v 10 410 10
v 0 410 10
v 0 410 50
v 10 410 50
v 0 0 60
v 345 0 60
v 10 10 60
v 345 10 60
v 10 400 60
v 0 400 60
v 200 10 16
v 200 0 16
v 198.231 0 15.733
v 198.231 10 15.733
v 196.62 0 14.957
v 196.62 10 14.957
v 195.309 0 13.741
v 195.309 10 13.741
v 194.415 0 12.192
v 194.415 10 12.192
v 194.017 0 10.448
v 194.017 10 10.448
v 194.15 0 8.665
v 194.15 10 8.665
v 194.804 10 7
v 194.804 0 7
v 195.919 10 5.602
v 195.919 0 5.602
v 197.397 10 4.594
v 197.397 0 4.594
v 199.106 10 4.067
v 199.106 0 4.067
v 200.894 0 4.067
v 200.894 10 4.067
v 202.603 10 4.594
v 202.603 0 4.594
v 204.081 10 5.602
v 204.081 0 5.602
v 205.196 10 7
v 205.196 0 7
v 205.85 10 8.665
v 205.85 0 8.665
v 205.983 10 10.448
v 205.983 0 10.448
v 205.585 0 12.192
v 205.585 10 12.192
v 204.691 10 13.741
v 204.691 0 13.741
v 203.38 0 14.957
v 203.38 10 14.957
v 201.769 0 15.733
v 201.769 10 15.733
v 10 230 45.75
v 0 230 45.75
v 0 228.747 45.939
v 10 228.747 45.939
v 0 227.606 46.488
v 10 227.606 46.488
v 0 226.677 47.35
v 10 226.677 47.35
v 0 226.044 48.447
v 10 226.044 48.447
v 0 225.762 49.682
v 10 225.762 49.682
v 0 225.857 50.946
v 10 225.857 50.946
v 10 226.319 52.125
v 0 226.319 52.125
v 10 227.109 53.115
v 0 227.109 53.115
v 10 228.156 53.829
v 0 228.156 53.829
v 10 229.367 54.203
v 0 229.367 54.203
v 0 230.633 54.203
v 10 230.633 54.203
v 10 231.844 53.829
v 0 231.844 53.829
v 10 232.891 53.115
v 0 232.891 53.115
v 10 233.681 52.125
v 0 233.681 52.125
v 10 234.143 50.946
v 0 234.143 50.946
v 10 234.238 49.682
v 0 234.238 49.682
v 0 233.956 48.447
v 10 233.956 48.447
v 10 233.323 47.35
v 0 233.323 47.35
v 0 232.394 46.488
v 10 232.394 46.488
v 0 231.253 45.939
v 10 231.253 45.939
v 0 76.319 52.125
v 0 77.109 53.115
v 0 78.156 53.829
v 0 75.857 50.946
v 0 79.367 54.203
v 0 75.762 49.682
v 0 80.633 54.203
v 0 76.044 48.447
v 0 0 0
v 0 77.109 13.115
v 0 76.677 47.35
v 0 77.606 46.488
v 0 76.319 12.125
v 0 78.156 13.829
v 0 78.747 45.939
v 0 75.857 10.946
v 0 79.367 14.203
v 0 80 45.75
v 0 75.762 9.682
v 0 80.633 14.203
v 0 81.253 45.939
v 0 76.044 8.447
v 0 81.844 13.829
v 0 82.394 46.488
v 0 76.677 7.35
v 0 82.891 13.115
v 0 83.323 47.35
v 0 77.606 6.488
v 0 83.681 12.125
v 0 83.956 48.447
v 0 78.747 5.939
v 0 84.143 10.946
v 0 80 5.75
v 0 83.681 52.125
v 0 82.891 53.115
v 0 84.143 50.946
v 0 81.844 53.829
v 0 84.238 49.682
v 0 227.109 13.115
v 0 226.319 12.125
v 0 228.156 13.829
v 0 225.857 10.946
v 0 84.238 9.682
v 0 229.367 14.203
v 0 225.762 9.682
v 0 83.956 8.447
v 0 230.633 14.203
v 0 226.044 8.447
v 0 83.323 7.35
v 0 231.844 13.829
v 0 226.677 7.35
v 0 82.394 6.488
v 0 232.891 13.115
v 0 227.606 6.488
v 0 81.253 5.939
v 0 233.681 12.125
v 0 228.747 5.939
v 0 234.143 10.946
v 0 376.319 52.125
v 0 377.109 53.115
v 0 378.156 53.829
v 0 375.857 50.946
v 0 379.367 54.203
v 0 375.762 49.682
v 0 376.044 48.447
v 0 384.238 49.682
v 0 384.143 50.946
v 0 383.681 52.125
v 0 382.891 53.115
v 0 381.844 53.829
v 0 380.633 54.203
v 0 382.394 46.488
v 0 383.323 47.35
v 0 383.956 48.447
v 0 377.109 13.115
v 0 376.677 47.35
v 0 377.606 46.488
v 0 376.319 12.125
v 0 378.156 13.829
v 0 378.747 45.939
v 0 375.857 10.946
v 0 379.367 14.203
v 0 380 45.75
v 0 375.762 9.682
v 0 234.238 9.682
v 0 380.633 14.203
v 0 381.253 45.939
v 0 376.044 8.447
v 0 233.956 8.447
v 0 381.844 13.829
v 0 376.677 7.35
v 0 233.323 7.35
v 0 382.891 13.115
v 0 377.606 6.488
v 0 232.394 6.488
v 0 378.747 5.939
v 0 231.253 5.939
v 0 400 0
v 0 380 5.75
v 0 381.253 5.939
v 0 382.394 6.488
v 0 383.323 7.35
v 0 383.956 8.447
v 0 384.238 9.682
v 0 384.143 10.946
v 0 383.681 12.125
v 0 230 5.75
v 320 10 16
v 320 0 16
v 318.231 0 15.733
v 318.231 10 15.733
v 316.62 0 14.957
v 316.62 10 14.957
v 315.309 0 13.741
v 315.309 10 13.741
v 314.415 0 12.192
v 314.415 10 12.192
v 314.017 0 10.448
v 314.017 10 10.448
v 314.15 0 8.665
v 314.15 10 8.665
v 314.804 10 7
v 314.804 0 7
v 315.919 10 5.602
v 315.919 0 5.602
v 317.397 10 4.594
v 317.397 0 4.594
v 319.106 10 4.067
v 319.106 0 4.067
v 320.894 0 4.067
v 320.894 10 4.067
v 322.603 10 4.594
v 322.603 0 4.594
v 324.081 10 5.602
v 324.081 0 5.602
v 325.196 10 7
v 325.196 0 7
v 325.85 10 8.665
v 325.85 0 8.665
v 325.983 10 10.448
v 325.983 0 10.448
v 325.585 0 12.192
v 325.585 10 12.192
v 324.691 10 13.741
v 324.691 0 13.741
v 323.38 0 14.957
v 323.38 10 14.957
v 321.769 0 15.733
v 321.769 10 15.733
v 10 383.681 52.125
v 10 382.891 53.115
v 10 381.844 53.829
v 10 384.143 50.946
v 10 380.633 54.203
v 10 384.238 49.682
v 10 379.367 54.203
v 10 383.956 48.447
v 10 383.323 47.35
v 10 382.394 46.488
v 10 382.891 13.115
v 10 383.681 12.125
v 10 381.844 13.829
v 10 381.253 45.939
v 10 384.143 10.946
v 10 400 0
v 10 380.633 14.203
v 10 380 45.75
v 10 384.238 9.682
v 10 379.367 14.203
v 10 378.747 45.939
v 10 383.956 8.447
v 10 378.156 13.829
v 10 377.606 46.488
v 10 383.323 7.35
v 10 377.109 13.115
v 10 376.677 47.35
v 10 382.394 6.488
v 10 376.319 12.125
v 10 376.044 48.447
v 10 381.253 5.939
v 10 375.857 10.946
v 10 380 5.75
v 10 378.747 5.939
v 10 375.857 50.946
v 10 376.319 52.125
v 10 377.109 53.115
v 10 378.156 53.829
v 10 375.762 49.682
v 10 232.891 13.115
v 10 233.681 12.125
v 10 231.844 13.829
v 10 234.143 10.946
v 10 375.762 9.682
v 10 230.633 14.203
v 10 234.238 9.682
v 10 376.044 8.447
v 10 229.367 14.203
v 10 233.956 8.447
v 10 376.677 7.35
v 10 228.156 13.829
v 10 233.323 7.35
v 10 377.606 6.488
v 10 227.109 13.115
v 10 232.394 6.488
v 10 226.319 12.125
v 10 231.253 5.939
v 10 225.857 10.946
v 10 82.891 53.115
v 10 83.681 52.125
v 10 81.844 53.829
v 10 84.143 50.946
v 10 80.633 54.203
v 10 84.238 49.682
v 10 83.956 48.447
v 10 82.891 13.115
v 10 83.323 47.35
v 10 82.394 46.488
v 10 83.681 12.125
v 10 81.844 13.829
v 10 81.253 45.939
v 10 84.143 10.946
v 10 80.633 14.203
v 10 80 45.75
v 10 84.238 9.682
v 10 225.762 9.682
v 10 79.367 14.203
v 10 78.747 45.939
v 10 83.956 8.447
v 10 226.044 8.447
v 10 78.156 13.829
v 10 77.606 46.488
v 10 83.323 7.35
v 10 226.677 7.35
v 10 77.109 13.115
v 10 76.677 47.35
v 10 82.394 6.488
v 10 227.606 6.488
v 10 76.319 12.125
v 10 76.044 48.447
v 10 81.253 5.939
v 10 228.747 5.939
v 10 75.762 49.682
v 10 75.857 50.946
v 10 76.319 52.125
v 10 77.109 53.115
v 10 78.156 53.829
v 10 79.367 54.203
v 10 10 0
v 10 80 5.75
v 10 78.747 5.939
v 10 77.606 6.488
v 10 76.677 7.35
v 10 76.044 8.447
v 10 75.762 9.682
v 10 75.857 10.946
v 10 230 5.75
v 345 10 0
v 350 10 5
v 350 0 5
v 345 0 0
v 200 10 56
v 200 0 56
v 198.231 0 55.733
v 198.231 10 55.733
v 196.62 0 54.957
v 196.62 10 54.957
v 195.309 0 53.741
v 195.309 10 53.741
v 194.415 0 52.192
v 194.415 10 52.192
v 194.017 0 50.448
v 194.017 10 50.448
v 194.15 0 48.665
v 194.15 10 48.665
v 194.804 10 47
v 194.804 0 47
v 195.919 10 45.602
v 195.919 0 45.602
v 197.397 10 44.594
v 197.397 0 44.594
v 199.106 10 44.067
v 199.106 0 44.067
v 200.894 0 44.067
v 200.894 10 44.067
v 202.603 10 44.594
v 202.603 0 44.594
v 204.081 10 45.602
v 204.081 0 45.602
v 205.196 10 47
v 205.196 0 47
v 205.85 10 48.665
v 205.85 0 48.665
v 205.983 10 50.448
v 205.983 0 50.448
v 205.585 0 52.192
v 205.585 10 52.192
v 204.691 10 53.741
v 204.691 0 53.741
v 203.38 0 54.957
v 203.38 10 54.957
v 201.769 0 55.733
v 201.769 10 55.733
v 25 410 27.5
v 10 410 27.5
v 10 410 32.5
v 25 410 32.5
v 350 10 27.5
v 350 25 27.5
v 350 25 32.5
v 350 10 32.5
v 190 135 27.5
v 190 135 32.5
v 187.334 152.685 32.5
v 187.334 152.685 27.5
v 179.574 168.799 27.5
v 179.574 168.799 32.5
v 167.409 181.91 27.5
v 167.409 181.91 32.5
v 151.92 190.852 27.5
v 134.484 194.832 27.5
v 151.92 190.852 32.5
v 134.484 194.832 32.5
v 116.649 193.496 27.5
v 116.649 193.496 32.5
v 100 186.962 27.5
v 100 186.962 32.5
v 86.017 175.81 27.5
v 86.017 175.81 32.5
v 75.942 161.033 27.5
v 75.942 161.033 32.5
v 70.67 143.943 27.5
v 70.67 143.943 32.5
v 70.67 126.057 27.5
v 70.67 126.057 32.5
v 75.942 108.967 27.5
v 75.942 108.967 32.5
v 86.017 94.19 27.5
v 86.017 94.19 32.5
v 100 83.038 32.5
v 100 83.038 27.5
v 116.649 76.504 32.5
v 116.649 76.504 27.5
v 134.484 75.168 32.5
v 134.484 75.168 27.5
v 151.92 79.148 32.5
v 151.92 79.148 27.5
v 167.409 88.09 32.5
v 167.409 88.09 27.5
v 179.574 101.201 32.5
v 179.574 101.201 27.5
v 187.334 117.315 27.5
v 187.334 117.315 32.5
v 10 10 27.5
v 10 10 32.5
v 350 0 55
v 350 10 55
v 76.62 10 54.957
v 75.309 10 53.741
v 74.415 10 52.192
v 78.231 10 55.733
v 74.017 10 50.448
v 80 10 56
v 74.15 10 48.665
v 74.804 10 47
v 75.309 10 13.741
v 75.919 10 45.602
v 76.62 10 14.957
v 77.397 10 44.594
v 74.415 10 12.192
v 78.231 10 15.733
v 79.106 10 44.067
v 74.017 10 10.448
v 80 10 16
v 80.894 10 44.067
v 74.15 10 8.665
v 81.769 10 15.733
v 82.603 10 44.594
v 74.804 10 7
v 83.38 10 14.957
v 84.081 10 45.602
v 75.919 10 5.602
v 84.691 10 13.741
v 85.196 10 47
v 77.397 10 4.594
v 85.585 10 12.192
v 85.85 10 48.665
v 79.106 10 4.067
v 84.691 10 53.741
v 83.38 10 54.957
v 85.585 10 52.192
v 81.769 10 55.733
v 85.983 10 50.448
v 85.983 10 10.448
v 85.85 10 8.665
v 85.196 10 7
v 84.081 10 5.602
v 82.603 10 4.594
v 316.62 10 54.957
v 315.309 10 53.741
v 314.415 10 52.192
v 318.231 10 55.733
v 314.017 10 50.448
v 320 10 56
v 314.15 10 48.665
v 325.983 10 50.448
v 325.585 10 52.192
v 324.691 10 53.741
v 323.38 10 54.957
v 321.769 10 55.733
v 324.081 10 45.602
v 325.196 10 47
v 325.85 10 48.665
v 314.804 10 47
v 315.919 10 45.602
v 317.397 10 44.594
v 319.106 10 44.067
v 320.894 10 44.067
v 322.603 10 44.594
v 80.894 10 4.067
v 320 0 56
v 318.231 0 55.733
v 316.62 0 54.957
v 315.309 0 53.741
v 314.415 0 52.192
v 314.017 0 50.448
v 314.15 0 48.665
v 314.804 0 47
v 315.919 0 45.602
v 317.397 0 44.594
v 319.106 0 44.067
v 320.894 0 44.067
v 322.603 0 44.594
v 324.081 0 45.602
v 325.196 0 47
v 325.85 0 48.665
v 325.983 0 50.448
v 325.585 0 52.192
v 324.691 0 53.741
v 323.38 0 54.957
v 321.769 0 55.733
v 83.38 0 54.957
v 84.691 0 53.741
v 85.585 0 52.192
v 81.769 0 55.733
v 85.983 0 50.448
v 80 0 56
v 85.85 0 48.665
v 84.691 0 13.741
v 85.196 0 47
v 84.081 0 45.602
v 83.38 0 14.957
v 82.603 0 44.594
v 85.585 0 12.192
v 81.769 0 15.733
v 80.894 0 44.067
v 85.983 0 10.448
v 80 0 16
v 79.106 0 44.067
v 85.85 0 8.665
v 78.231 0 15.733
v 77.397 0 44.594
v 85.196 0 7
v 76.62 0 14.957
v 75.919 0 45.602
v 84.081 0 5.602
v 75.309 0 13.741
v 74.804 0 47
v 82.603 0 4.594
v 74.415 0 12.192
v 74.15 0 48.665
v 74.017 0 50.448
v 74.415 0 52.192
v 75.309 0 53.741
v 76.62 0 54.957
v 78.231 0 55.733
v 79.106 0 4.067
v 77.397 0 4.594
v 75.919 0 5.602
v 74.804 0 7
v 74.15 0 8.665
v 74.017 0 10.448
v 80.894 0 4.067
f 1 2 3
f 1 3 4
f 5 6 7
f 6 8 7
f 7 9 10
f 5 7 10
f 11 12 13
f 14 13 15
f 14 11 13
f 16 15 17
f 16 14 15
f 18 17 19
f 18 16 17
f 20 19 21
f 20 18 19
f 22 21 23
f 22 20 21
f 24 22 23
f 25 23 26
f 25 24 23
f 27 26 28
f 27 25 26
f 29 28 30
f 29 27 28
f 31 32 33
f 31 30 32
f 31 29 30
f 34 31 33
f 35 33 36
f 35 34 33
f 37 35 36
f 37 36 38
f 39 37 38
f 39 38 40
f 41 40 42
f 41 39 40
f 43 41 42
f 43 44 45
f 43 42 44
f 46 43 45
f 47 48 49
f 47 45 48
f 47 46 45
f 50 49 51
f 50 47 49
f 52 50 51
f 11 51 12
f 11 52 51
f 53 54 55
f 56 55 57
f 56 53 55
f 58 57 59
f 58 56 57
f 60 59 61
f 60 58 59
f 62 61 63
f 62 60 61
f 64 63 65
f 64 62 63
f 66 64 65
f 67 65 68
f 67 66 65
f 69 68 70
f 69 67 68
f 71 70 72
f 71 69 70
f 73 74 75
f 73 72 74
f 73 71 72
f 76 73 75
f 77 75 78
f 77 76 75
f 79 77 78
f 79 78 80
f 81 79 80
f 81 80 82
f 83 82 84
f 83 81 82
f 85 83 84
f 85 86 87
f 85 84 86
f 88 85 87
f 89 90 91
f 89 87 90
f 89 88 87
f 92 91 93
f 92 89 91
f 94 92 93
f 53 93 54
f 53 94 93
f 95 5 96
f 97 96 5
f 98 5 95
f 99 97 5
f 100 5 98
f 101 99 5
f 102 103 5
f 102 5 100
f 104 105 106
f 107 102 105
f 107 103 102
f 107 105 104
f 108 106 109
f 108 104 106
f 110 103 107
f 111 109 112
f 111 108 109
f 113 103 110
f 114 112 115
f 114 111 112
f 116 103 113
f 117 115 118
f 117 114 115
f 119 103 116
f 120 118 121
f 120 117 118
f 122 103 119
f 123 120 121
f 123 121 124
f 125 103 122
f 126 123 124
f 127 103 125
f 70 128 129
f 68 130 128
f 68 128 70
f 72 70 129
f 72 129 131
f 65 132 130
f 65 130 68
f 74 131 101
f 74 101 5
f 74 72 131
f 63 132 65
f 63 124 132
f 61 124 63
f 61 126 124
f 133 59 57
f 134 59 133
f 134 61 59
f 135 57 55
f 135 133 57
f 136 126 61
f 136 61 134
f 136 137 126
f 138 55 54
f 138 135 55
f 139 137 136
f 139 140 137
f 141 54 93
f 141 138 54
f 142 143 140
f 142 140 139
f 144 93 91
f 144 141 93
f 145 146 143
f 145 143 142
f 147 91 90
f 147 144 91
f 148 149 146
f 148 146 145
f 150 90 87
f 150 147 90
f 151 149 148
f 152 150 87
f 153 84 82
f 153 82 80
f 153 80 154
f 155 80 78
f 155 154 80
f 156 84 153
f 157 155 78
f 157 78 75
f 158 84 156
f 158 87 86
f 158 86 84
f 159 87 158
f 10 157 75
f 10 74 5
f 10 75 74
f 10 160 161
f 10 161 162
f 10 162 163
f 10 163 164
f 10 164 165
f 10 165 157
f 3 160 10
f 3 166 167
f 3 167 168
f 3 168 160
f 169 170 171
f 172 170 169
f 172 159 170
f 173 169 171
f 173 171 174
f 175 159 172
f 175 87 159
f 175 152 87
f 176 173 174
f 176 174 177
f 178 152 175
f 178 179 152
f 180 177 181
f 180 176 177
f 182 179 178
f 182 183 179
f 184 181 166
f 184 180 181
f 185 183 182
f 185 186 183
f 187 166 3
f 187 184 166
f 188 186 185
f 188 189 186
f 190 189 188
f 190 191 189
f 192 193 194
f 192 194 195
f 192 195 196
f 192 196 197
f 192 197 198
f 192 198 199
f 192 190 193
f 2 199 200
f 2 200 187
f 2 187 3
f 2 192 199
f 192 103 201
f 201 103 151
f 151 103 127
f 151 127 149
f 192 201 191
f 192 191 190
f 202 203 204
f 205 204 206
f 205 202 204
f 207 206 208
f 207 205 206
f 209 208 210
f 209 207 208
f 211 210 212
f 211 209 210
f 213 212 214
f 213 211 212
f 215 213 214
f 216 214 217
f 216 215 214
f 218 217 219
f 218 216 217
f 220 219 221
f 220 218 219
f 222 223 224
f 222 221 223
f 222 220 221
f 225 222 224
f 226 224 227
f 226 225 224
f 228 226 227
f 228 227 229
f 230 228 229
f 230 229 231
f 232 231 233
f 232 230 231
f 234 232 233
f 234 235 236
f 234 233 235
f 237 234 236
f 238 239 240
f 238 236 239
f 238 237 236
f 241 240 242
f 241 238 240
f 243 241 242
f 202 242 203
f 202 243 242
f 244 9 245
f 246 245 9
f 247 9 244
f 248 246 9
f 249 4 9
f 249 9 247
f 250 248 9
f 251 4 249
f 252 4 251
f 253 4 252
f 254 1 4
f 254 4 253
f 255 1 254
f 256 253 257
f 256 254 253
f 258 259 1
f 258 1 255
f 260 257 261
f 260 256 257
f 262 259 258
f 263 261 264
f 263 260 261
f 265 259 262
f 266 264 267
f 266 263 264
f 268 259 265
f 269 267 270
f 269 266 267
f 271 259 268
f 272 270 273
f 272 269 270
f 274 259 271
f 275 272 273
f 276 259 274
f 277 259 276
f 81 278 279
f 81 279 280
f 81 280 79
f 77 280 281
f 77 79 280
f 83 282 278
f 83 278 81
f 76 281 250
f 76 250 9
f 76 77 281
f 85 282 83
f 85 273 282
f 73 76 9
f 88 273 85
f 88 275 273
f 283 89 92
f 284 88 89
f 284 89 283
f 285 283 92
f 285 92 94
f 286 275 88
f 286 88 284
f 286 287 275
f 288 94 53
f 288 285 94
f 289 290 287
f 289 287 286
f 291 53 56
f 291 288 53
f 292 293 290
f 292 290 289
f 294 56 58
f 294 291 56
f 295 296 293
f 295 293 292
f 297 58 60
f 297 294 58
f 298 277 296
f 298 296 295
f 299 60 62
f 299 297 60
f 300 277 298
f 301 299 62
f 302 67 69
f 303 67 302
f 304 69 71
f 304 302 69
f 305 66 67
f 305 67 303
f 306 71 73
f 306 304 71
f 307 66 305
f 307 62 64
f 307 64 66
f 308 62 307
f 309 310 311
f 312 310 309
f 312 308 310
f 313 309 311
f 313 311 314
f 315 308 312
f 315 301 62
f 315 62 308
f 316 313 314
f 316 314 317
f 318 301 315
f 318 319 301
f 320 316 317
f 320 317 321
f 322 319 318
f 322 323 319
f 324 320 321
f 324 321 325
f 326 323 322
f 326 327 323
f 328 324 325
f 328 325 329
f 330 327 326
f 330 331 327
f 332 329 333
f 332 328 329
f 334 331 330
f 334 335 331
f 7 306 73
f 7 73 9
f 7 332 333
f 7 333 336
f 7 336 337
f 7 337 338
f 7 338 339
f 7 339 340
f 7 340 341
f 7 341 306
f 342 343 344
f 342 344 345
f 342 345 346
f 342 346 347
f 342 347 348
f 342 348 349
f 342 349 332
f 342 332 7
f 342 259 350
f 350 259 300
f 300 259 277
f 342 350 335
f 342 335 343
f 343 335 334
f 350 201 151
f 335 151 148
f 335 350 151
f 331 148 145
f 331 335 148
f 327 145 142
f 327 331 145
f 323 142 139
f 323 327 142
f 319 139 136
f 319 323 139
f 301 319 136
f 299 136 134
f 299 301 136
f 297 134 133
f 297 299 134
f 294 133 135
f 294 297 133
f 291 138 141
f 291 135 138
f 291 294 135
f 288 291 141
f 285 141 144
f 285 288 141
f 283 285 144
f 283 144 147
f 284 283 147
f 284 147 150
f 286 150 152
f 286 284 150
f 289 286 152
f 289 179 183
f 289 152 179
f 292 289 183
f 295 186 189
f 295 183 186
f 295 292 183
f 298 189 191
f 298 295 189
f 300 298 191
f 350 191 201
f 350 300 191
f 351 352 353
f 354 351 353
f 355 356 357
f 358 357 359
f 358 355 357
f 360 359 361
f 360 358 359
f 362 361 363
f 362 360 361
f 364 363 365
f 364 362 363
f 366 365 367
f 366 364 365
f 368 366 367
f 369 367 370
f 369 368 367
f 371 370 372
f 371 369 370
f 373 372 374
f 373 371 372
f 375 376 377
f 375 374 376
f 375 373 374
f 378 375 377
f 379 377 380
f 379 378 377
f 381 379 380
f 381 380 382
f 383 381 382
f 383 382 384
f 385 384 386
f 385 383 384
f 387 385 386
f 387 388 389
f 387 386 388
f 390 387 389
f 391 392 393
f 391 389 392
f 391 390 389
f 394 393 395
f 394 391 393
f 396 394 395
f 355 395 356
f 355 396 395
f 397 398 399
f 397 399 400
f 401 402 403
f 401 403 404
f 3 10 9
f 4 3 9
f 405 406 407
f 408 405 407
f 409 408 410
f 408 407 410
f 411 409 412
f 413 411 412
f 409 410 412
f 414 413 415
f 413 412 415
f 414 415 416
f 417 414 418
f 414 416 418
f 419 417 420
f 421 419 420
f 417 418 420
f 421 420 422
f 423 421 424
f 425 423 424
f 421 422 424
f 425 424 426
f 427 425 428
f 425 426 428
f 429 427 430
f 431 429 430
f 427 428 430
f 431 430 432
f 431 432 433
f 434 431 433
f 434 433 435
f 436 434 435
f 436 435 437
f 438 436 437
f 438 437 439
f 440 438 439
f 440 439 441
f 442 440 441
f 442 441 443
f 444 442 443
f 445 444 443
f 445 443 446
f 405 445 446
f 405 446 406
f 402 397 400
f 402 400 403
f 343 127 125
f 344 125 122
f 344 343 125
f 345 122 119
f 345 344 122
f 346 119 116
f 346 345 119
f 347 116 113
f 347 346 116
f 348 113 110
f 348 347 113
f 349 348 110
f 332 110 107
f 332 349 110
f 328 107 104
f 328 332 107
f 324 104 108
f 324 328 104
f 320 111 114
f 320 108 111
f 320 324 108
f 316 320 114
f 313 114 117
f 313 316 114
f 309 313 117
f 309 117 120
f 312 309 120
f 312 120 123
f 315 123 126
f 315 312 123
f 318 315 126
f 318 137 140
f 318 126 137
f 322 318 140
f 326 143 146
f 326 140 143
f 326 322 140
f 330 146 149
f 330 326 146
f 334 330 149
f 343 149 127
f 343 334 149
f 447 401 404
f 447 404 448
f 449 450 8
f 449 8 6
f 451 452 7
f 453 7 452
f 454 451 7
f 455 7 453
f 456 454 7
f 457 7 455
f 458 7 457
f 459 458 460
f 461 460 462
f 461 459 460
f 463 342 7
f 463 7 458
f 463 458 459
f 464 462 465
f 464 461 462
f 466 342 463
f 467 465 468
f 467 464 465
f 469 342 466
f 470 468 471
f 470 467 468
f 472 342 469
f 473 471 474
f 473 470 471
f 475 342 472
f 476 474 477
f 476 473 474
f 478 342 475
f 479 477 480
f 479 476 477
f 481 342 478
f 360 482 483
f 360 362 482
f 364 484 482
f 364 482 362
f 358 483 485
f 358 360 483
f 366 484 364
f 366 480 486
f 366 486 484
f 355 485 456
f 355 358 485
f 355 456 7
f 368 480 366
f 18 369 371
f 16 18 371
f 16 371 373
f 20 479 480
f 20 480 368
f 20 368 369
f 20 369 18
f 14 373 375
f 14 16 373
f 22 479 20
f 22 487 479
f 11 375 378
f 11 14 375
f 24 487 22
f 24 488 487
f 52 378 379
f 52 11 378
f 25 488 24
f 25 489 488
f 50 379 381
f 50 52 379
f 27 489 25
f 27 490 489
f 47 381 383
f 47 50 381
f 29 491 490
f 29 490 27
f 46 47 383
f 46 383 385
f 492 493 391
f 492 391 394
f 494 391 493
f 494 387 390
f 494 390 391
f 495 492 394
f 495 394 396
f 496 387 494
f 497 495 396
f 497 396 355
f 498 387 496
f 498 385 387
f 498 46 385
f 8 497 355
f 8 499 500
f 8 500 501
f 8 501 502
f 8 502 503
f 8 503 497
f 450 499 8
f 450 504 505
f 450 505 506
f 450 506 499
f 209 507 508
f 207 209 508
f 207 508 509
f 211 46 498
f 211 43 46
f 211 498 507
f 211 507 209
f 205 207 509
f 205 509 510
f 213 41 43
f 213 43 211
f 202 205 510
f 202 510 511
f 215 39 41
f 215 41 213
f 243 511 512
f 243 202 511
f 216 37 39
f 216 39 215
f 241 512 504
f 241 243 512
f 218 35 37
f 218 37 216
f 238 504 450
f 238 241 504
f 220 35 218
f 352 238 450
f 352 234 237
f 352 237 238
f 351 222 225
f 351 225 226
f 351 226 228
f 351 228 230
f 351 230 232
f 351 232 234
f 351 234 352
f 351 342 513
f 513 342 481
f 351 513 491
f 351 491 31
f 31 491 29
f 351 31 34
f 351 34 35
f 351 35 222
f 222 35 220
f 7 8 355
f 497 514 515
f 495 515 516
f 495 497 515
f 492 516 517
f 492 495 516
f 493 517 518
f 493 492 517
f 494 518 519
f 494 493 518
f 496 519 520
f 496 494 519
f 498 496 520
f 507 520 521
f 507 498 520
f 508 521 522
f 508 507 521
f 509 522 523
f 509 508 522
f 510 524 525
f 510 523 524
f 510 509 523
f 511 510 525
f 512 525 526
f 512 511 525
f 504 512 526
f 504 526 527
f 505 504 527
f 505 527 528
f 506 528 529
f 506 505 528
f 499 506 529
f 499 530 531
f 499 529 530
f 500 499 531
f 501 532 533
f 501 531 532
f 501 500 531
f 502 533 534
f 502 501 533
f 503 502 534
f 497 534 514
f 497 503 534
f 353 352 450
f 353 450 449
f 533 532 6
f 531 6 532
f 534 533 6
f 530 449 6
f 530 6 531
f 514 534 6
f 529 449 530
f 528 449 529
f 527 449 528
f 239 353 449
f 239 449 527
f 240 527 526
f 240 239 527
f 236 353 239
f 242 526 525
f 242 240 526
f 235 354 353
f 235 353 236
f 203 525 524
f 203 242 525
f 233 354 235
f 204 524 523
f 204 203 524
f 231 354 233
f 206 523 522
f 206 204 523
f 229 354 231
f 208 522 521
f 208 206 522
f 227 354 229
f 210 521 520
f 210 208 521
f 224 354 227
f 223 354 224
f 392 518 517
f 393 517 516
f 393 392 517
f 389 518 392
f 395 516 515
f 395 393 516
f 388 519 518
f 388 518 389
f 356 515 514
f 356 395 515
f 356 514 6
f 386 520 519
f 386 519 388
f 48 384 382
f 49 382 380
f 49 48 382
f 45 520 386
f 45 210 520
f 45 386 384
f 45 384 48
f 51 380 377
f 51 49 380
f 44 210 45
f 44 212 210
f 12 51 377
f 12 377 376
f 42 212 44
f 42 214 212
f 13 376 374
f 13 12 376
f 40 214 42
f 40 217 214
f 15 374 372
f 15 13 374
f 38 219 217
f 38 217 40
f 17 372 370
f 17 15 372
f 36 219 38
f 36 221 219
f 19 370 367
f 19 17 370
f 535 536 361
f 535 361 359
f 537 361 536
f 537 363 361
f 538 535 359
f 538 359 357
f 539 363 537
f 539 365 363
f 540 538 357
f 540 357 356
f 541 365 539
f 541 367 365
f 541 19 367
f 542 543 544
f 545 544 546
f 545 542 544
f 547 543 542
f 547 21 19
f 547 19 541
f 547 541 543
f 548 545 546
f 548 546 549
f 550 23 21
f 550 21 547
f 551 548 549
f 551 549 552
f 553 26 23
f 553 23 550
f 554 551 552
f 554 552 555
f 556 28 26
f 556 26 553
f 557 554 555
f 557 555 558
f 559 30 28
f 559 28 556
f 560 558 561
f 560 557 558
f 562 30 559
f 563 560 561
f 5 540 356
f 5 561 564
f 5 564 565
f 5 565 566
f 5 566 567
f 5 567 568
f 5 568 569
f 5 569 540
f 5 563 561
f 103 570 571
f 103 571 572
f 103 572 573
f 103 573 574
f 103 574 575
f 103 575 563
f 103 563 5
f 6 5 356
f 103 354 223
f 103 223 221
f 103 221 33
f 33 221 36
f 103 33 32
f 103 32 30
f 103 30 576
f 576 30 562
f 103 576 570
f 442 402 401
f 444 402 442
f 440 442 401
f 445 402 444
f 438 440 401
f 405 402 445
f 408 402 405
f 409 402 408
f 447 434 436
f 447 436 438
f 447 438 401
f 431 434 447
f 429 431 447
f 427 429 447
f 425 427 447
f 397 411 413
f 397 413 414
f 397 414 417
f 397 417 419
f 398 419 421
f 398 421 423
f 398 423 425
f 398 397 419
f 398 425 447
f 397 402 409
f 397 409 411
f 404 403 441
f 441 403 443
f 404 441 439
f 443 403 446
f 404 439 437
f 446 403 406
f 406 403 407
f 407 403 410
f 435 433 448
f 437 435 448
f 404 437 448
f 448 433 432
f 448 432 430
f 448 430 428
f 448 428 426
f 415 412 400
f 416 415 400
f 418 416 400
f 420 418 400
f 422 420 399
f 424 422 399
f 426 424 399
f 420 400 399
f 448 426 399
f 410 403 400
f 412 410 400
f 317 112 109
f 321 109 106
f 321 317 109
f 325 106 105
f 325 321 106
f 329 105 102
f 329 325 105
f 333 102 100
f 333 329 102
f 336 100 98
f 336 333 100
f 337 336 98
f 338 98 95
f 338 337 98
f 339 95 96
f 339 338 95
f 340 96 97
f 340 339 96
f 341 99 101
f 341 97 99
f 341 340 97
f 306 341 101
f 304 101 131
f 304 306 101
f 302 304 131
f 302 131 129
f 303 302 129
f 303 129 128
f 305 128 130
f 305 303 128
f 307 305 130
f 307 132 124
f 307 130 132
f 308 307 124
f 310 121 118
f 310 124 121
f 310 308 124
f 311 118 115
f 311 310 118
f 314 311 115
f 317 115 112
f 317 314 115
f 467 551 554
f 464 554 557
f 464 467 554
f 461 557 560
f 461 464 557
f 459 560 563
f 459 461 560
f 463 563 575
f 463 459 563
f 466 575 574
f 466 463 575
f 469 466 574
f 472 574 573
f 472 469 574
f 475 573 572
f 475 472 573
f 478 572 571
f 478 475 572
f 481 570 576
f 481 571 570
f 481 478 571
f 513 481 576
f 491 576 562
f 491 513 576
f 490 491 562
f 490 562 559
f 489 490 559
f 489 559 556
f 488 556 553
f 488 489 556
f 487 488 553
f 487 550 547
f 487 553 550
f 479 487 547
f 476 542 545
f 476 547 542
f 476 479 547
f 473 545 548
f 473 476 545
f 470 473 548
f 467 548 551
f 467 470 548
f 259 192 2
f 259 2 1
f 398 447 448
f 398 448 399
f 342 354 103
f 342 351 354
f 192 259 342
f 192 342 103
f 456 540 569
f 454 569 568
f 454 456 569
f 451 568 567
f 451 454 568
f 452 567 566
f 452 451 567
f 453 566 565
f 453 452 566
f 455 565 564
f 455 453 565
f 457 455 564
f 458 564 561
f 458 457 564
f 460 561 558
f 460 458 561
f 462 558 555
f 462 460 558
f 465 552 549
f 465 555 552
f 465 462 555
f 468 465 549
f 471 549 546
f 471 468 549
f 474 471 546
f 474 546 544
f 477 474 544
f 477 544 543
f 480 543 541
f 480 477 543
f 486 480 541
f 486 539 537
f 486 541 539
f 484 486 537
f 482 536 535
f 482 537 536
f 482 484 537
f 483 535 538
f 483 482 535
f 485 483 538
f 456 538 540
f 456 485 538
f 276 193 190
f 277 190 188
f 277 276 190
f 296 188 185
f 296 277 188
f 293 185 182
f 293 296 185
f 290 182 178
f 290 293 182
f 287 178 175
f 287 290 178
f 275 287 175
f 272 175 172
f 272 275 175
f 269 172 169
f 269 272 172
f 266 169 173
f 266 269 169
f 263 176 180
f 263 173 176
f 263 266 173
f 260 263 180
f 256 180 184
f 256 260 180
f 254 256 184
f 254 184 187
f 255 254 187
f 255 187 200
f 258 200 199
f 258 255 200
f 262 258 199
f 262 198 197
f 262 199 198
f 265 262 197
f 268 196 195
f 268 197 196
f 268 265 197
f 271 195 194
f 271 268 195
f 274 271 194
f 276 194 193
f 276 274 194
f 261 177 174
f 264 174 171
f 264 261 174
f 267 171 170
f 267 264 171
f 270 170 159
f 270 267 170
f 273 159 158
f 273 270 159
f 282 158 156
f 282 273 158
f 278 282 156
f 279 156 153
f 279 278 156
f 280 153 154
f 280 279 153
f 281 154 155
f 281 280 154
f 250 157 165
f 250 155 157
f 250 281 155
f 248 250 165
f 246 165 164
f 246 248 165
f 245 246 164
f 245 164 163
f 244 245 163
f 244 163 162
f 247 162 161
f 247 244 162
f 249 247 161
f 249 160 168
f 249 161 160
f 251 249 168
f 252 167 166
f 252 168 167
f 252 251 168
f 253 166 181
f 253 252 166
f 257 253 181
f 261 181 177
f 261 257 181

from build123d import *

# Parameters (mm, degrees)
EXTRUDE_1_DEPTH                  = 60
CHAMFER_1_SIZE                   = 10
CHAMFER_2_SIZE                   = 5
GUSSET_1_THICKNESS               = 5
HOLE_WIZARD_M10_2_AT_2_COUNT     = 2
HOLE_WIZARD_M10_2_AT_2_PITCH     = 150
HOLE_WIZARD_M10_2_AT_3_COUNT     = 2
HOLE_WIZARD_M10_2_AT_3_PITCH     = 40
HOLE_WIZARD_M10_2_AT_4_COUNT     = 2
HOLE_WIZARD_M10_2_AT_4_PITCH     = 155.241746963
HOLE_WIZARD_M10_2_AT_5_COUNT     = 2
HOLE_WIZARD_M10_2_AT_5_PITCH     = 300
HOLE_WIZARD_M10_2_AT_6_COUNT     = 2
HOLE_WIZARD_M10_2_AT_6_PITCH     = 302.654919008
HOLE_WIZARD_12_0_12_3_AT_2_COUNT = 2
HOLE_WIZARD_12_0_12_3_AT_2_PITCH = 120
HOLE_WIZARD_12_0_12_3_AT_3_COUNT = 2
HOLE_WIZARD_12_0_12_3_AT_3_PITCH = 40
HOLE_WIZARD_12_0_12_3_AT_4_COUNT = 2
HOLE_WIZARD_12_0_12_3_AT_4_PITCH = 126.491106407
HOLE_WIZARD_12_0_12_3_AT_5_COUNT = 2
HOLE_WIZARD_12_0_12_3_AT_5_PITCH = 120
HOLE_WIZARD_12_0_12_3_AT_6_COUNT = 2
HOLE_WIZARD_12_0_12_3_AT_6_PITCH = 126.491106407
SKETCH_11_R                      = 60
CUT_EXTRUDE_1_DEPTH              = 10


with BuildPart() as part:
    # 草图1 → 凸台-拉伸1 (new body)
    with BuildSketch(Plane.XY):
        Polygon((0, 0), (0, 410), (10, 410), (10, 10), (350, 10), (350, 0), align=None)
    extrude(amount=EXTRUDE_1_DEPTH)

    # 倒角1
    chamfer_1_edges = [part.edges().sort_by_distance(p)[0] for p in [
        (5, 410, 60),
        (5, 410, 0),
    ]]
    chamfer(chamfer_1_edges, length=CHAMFER_1_SIZE)

    # 倒角2
    chamfer_2_edges = [part.edges().sort_by_distance(p)[0] for p in [
        (350, 5, 60),
        (350, 5, 0),
    ]]
    chamfer(chamfer_2_edges, length=CHAMFER_2_SIZE)

    # 草图8 → M10 螺纹孔2 (revolve, cut)
    with BuildSketch(Plane(origin=(10, 380, 50), x_dir=(0, 0, -1), z_dir=(0, 1, 0))):
        Polygon((0, 0), (0, 30.053657631), (4.25, 27.5), (4.25, 0), align=None)
    hole_wizard_m10_2 = revolve(axis=Axis((16.35, 380, 50), (-1, 0, 0)), mode=Mode.SUBTRACT)

    # M10 螺纹孔2 at 2: M10 螺纹孔2 ×2
    with Locations(*[(0, -i * HOLE_WIZARD_M10_2_AT_2_PITCH, 0) for i in range(1, HOLE_WIZARD_M10_2_AT_2_COUNT)]):
        add(hole_wizard_m10_2, mode=Mode.SUBTRACT)

    # M10 螺纹孔2 at 3: M10 螺纹孔2 ×2
    with Locations(*[(0, 0, -i * HOLE_WIZARD_M10_2_AT_3_PITCH) for i in range(1, HOLE_WIZARD_M10_2_AT_3_COUNT)]):
        add(hole_wizard_m10_2, mode=Mode.SUBTRACT)

    # M10 螺纹孔2 at 4: M10 螺纹孔2 ×2
    with Locations(*[Vector(0, -0.9662349396012463, -0.25766265056033233) * (i * HOLE_WIZARD_M10_2_AT_4_PITCH) for i in range(1, HOLE_WIZARD_M10_2_AT_4_COUNT)]):
        add(hole_wizard_m10_2, mode=Mode.SUBTRACT)

    # M10 螺纹孔2 at 5: M10 螺纹孔2 ×2
    with Locations(*[(0, -i * HOLE_WIZARD_M10_2_AT_5_PITCH, 0) for i in range(1, HOLE_WIZARD_M10_2_AT_5_COUNT)]):
        add(hole_wizard_m10_2, mode=Mode.SUBTRACT)

    # M10 螺纹孔2 at 6: M10 螺纹孔2 ×2
    with Locations(*[Vector(0, -0.9912279006826347, -0.13216372009101798) * (i * HOLE_WIZARD_M10_2_AT_6_PITCH) for i in range(1, HOLE_WIZARD_M10_2_AT_6_COUNT)]):
        add(hole_wizard_m10_2, mode=Mode.SUBTRACT)

    # 草图10 → Ø12.0 (12) 直径孔3 (revolve, cut)
    with BuildSketch(Plane(origin=(200, 10, 50), x_dir=(0, 0, 1), z_dir=(1, 0, 0))):
        Polygon((0, 0), (0, 31.105163714), (6, 27.5), (6, 0), align=None)
    hole_wizard_12_0_12_3 = revolve(axis=Axis((200, 16.35, 50), (0, -1, 0)), mode=Mode.SUBTRACT)

    # Ø12.0 (12) 直径孔3 at 2: Ø12.0 (12) 直径孔3 ×2
    with Locations(*[(i * HOLE_WIZARD_12_0_12_3_AT_2_PITCH, 0, 0) for i in range(1, HOLE_WIZARD_12_0_12_3_AT_2_COUNT)]):
        add(hole_wizard_12_0_12_3, mode=Mode.SUBTRACT)

    # Ø12.0 (12) 直径孔3 at 3: Ø12.0 (12) 直径孔3 ×2
    with Locations(*[(0, 0, -i * HOLE_WIZARD_12_0_12_3_AT_3_PITCH) for i in range(1, HOLE_WIZARD_12_0_12_3_AT_3_COUNT)]):
        add(hole_wizard_12_0_12_3, mode=Mode.SUBTRACT)

    # Ø12.0 (12) 直径孔3 at 4: Ø12.0 (12) 直径孔3 ×2
    with Locations(*[Vector(0.9486832980505139, 0, -0.316227766016838) * (i * HOLE_WIZARD_12_0_12_3_AT_4_PITCH) for i in range(1, HOLE_WIZARD_12_0_12_3_AT_4_COUNT)]):
        add(hole_wizard_12_0_12_3, mode=Mode.SUBTRACT)

    # Ø12.0 (12) 直径孔3 at 5: Ø12.0 (12) 直径孔3 ×2
    with Locations(*[(-i * HOLE_WIZARD_12_0_12_3_AT_5_PITCH, 0, 0) for i in range(1, HOLE_WIZARD_12_0_12_3_AT_5_COUNT)]):
        add(hole_wizard_12_0_12_3, mode=Mode.SUBTRACT)

    # Ø12.0 (12) 直径孔3 at 6: Ø12.0 (12) 直径孔3 ×2
    with Locations(*[Vector(-0.9486832980505138, 0, -0.316227766016838) * (i * HOLE_WIZARD_12_0_12_3_AT_6_PITCH) for i in range(1, HOLE_WIZARD_12_0_12_3_AT_6_COUNT)]):
        add(hole_wizard_12_0_12_3, mode=Mode.SUBTRACT)


with BuildPart() as body_2:
    # Gusset 1: a gusset: a plate 5.0 thick in the corner of two members, its outline drawn in place
    gusset_1_outline = Wire([Line((10, 10, 27.5), (10, 410, 27.5)), Line((10, 410, 27.5), (25, 410, 27.5)), Line((25, 410, 27.5), (350, 25, 27.5)), Line((350, 25, 27.5), (350, 10, 27.5)), Line((350, 10, 27.5), (10, 10, 27.5))])
    add(extrude(Face(gusset_1_outline), amount=GUSSET_1_THICKNESS, dir=(0, 0, 1)))

    # 草图11 → 切除-拉伸1 (cut)
    with BuildSketch(Plane.XY.offset(32.5)):
        with Locations((130, 135)):
            Circle(SKETCH_11_R)
    extrude(amount=-CUT_EXTRUDE_1_DEPTH, mode=Mode.SUBTRACT)


solid = Compound([part.part, body_2.part])
